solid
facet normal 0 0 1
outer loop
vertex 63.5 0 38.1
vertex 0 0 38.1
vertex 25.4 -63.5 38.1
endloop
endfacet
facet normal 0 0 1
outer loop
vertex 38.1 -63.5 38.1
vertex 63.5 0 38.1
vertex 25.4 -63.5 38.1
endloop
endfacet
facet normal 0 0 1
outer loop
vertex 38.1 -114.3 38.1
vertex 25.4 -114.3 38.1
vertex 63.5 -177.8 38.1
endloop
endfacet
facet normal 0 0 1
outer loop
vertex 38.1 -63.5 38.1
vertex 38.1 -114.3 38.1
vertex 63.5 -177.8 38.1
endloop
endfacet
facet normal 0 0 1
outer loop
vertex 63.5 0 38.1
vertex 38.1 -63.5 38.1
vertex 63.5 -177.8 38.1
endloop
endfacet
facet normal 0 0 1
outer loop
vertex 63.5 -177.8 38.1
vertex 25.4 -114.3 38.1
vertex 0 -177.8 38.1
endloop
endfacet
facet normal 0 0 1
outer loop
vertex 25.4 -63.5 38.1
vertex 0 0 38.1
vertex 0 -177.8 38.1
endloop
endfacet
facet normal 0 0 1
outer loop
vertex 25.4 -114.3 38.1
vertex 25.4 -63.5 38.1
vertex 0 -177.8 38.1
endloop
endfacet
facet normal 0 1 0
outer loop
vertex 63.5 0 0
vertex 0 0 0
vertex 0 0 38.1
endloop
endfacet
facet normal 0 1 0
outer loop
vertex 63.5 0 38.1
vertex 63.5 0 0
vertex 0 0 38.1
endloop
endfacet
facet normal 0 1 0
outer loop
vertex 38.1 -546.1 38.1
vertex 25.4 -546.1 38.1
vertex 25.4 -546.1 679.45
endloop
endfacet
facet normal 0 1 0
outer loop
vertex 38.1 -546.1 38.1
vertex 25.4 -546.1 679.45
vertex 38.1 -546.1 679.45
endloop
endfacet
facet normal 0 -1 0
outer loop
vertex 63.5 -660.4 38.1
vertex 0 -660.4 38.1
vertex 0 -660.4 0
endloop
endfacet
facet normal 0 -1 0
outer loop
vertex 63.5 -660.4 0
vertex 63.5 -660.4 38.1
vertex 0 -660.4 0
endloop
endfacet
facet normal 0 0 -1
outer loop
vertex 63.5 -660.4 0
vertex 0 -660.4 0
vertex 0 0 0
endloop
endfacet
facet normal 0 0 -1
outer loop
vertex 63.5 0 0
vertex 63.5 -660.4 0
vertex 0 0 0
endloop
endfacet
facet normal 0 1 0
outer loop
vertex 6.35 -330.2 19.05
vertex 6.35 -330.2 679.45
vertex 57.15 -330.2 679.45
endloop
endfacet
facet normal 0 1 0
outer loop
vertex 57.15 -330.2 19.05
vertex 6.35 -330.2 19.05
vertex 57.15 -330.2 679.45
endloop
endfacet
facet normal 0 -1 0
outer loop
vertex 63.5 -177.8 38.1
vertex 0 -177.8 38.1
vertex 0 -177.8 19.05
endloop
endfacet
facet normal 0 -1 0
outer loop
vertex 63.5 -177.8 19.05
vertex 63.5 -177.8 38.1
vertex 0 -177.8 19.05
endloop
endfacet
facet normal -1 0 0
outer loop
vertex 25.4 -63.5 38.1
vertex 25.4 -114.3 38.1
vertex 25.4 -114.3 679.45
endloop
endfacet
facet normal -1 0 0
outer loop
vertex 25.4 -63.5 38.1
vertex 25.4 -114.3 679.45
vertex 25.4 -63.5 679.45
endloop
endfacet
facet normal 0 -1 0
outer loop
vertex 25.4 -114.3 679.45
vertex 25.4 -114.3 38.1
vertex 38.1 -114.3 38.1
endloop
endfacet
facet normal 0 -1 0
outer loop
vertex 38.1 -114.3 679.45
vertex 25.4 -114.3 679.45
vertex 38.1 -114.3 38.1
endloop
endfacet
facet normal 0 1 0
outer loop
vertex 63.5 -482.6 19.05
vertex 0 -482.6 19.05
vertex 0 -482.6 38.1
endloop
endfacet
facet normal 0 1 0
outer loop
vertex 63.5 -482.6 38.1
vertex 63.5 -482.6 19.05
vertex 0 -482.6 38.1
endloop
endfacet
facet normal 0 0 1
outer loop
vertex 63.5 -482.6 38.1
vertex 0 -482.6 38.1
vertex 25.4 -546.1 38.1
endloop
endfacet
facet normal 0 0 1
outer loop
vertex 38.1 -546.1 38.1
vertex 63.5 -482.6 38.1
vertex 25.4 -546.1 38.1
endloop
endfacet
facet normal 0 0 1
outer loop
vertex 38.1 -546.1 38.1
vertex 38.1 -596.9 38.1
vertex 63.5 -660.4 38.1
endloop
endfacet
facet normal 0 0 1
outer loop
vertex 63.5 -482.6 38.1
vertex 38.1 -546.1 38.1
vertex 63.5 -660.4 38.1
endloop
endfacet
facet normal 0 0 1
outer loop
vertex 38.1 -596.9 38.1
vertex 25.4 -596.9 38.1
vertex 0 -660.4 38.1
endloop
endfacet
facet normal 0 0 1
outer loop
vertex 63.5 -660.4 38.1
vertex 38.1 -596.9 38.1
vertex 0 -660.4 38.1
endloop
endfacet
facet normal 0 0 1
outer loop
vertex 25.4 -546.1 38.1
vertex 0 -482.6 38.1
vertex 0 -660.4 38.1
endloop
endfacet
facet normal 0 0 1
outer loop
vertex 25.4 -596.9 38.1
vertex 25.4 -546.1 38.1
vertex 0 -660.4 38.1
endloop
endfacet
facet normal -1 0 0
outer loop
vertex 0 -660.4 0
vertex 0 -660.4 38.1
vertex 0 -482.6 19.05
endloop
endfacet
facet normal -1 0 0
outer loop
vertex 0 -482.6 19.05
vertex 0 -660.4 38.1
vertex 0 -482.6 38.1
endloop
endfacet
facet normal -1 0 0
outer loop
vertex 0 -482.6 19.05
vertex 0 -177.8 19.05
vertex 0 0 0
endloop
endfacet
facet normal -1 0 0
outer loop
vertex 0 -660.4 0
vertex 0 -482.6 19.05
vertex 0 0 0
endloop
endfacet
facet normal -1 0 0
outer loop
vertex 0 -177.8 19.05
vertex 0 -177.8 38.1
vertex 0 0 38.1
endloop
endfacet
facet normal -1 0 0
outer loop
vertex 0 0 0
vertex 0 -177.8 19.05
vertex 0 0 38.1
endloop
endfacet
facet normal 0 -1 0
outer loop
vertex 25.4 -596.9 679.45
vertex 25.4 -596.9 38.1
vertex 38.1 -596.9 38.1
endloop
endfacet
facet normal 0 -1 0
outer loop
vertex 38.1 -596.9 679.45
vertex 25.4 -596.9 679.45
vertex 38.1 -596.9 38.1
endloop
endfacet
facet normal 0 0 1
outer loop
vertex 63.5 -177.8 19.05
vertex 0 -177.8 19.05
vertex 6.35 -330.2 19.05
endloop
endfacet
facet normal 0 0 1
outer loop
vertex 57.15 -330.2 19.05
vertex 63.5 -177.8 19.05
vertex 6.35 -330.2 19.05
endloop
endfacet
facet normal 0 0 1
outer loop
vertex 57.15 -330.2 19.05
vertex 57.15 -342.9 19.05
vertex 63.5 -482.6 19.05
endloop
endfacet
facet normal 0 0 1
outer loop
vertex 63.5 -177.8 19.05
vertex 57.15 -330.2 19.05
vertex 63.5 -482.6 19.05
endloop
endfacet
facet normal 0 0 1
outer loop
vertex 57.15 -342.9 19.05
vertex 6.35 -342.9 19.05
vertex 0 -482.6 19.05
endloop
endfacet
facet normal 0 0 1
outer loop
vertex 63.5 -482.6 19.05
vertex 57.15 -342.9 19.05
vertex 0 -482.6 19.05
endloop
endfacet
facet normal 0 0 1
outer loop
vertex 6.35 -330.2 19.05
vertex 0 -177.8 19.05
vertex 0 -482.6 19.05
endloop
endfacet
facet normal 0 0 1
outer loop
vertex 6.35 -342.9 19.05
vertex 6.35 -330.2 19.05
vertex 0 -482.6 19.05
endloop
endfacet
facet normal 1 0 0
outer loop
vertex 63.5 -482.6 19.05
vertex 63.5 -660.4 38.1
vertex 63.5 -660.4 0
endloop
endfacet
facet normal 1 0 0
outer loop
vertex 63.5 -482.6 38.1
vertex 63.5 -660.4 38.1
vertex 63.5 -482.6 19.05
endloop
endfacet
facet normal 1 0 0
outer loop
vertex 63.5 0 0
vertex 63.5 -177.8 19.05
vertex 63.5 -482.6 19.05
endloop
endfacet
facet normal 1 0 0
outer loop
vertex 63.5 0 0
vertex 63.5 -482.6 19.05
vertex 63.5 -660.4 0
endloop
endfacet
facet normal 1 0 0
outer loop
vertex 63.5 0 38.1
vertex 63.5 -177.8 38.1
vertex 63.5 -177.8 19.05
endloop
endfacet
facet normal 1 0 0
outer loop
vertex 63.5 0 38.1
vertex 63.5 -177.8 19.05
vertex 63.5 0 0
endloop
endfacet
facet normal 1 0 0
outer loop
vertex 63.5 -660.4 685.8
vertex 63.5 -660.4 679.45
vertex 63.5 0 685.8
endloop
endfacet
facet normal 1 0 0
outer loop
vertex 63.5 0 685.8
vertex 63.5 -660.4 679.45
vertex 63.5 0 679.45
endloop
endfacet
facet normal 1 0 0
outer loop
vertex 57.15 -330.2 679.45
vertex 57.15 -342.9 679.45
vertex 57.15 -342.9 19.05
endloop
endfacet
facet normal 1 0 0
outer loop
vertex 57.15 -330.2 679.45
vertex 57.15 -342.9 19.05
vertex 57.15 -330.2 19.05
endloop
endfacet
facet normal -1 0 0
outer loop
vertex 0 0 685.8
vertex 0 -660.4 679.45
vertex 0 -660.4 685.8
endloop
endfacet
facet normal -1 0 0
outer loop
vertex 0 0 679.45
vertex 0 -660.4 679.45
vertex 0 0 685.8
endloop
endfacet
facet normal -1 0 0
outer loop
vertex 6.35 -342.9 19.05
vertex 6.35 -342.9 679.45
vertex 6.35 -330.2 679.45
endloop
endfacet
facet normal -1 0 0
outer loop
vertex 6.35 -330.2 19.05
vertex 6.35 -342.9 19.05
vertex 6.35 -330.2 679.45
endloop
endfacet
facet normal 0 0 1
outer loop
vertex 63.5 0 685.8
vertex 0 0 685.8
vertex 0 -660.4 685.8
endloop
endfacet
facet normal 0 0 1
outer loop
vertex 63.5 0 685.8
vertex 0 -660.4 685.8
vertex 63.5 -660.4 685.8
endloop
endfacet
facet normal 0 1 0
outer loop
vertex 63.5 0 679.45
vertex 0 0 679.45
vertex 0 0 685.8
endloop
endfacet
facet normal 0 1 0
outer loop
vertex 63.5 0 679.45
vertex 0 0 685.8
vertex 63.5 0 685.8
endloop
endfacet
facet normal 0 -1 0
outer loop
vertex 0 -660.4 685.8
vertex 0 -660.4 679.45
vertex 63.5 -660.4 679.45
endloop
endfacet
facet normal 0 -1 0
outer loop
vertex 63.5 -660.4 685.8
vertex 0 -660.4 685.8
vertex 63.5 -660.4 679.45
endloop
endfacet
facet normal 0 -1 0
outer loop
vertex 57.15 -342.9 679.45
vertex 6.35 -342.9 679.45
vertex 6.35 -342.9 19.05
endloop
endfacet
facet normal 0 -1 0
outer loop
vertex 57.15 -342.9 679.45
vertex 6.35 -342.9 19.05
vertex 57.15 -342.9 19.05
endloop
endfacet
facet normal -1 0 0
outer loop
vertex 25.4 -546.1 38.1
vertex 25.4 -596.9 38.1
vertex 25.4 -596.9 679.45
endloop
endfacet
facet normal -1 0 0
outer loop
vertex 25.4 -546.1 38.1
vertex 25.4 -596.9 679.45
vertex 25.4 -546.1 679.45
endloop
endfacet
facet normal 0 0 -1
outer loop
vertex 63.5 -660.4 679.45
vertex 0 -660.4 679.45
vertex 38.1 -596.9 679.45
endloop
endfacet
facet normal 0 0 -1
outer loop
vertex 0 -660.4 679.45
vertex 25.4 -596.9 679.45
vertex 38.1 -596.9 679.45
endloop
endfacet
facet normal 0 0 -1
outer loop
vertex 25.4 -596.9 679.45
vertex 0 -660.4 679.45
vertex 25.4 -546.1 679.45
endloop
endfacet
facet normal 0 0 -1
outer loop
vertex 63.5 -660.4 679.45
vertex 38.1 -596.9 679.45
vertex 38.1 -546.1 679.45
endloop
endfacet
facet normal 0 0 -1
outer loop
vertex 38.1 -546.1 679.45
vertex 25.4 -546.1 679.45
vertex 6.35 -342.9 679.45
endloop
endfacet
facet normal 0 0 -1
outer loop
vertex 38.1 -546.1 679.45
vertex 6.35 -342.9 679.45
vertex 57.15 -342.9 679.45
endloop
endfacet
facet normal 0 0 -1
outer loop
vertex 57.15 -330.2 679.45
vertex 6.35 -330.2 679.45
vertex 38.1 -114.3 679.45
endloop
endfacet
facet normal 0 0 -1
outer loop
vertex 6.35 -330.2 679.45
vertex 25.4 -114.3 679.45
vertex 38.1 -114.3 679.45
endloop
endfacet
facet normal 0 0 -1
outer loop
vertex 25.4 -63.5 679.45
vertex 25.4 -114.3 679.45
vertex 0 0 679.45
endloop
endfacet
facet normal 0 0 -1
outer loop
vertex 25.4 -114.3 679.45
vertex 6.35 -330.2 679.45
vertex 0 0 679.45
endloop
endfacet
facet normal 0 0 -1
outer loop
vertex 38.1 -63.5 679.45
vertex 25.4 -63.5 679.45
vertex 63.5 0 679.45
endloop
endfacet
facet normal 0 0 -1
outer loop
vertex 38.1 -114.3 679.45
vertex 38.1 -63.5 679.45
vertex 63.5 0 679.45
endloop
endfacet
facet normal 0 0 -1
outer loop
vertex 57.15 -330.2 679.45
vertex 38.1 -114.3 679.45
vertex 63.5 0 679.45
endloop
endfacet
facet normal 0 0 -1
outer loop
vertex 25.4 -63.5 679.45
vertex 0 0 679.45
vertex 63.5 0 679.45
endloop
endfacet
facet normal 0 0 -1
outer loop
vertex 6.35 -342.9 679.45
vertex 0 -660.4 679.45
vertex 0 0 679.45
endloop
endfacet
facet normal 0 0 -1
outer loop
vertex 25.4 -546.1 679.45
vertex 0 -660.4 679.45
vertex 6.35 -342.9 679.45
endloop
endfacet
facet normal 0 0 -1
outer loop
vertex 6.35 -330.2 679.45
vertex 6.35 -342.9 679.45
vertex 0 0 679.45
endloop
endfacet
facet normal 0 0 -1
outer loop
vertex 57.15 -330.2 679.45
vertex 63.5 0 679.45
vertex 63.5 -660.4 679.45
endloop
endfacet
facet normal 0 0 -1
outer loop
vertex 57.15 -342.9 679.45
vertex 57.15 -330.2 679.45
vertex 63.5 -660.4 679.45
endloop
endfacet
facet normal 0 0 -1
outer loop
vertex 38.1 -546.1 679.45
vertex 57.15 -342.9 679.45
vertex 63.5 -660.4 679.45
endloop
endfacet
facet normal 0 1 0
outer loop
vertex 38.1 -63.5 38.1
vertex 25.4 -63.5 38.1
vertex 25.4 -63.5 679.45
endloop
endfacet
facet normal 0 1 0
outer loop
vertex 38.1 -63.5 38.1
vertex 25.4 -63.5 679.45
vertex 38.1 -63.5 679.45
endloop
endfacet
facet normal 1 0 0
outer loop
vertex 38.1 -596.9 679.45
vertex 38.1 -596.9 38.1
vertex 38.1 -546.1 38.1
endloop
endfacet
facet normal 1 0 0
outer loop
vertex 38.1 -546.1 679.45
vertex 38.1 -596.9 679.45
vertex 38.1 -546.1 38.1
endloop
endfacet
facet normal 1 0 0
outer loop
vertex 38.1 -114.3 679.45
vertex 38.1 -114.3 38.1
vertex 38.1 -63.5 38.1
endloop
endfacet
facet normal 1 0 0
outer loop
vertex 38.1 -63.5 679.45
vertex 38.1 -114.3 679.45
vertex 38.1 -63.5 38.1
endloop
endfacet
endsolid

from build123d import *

# Parameters (mm, degrees)
F1_DEPTH = 63.5
F3_W     = 50.8
F3_H     = 12.7
F4_DEPTH = 660.4
F2_W     = 12.7
F2_H     = 50.8
F5_DEPTH = 641.35
F6_W     = 63.5
F6_H     = 660.4
F7_DEPTH = 6.35


with BuildPart() as f1:
    # F0 (on Right) → F1 (new body)
    with BuildSketch(Plane.YZ):
        Polygon((-660.4, 0), (0, 0), (0, 38.1), (-177.8, 38.1), (-177.8, 19.05), (-482.6, 19.05), (-482.6, 38.1), (-660.4, 38.1), align=None)
    extrude(amount=F1_DEPTH)

    # F3 (on face) → F4 (join)
    with BuildSketch(Plane.XY.offset(19.05)):
        with Locations((31.75, -336.55)):
            Rectangle(F3_W, F3_H)
    extrude(amount=F4_DEPTH)

    # F2 (on face) → F5 (join)
    with BuildSketch(Plane.XY.offset(38.1)):
        with Locations((31.75, -571.5)):
            Rectangle(F2_W, F2_H)
        with Locations((31.75, -88.9)):
            Rectangle(F2_W, F2_H)
    extrude(amount=F5_DEPTH)

    # F6 (on face) → F7 (join)
    with BuildSketch(Plane.XY.offset(679.45)):
        with Locations((31.75, -330.2)):
            Rectangle(F6_W, F6_H)
    extrude(amount=F7_DEPTH)


solid = f1.part
